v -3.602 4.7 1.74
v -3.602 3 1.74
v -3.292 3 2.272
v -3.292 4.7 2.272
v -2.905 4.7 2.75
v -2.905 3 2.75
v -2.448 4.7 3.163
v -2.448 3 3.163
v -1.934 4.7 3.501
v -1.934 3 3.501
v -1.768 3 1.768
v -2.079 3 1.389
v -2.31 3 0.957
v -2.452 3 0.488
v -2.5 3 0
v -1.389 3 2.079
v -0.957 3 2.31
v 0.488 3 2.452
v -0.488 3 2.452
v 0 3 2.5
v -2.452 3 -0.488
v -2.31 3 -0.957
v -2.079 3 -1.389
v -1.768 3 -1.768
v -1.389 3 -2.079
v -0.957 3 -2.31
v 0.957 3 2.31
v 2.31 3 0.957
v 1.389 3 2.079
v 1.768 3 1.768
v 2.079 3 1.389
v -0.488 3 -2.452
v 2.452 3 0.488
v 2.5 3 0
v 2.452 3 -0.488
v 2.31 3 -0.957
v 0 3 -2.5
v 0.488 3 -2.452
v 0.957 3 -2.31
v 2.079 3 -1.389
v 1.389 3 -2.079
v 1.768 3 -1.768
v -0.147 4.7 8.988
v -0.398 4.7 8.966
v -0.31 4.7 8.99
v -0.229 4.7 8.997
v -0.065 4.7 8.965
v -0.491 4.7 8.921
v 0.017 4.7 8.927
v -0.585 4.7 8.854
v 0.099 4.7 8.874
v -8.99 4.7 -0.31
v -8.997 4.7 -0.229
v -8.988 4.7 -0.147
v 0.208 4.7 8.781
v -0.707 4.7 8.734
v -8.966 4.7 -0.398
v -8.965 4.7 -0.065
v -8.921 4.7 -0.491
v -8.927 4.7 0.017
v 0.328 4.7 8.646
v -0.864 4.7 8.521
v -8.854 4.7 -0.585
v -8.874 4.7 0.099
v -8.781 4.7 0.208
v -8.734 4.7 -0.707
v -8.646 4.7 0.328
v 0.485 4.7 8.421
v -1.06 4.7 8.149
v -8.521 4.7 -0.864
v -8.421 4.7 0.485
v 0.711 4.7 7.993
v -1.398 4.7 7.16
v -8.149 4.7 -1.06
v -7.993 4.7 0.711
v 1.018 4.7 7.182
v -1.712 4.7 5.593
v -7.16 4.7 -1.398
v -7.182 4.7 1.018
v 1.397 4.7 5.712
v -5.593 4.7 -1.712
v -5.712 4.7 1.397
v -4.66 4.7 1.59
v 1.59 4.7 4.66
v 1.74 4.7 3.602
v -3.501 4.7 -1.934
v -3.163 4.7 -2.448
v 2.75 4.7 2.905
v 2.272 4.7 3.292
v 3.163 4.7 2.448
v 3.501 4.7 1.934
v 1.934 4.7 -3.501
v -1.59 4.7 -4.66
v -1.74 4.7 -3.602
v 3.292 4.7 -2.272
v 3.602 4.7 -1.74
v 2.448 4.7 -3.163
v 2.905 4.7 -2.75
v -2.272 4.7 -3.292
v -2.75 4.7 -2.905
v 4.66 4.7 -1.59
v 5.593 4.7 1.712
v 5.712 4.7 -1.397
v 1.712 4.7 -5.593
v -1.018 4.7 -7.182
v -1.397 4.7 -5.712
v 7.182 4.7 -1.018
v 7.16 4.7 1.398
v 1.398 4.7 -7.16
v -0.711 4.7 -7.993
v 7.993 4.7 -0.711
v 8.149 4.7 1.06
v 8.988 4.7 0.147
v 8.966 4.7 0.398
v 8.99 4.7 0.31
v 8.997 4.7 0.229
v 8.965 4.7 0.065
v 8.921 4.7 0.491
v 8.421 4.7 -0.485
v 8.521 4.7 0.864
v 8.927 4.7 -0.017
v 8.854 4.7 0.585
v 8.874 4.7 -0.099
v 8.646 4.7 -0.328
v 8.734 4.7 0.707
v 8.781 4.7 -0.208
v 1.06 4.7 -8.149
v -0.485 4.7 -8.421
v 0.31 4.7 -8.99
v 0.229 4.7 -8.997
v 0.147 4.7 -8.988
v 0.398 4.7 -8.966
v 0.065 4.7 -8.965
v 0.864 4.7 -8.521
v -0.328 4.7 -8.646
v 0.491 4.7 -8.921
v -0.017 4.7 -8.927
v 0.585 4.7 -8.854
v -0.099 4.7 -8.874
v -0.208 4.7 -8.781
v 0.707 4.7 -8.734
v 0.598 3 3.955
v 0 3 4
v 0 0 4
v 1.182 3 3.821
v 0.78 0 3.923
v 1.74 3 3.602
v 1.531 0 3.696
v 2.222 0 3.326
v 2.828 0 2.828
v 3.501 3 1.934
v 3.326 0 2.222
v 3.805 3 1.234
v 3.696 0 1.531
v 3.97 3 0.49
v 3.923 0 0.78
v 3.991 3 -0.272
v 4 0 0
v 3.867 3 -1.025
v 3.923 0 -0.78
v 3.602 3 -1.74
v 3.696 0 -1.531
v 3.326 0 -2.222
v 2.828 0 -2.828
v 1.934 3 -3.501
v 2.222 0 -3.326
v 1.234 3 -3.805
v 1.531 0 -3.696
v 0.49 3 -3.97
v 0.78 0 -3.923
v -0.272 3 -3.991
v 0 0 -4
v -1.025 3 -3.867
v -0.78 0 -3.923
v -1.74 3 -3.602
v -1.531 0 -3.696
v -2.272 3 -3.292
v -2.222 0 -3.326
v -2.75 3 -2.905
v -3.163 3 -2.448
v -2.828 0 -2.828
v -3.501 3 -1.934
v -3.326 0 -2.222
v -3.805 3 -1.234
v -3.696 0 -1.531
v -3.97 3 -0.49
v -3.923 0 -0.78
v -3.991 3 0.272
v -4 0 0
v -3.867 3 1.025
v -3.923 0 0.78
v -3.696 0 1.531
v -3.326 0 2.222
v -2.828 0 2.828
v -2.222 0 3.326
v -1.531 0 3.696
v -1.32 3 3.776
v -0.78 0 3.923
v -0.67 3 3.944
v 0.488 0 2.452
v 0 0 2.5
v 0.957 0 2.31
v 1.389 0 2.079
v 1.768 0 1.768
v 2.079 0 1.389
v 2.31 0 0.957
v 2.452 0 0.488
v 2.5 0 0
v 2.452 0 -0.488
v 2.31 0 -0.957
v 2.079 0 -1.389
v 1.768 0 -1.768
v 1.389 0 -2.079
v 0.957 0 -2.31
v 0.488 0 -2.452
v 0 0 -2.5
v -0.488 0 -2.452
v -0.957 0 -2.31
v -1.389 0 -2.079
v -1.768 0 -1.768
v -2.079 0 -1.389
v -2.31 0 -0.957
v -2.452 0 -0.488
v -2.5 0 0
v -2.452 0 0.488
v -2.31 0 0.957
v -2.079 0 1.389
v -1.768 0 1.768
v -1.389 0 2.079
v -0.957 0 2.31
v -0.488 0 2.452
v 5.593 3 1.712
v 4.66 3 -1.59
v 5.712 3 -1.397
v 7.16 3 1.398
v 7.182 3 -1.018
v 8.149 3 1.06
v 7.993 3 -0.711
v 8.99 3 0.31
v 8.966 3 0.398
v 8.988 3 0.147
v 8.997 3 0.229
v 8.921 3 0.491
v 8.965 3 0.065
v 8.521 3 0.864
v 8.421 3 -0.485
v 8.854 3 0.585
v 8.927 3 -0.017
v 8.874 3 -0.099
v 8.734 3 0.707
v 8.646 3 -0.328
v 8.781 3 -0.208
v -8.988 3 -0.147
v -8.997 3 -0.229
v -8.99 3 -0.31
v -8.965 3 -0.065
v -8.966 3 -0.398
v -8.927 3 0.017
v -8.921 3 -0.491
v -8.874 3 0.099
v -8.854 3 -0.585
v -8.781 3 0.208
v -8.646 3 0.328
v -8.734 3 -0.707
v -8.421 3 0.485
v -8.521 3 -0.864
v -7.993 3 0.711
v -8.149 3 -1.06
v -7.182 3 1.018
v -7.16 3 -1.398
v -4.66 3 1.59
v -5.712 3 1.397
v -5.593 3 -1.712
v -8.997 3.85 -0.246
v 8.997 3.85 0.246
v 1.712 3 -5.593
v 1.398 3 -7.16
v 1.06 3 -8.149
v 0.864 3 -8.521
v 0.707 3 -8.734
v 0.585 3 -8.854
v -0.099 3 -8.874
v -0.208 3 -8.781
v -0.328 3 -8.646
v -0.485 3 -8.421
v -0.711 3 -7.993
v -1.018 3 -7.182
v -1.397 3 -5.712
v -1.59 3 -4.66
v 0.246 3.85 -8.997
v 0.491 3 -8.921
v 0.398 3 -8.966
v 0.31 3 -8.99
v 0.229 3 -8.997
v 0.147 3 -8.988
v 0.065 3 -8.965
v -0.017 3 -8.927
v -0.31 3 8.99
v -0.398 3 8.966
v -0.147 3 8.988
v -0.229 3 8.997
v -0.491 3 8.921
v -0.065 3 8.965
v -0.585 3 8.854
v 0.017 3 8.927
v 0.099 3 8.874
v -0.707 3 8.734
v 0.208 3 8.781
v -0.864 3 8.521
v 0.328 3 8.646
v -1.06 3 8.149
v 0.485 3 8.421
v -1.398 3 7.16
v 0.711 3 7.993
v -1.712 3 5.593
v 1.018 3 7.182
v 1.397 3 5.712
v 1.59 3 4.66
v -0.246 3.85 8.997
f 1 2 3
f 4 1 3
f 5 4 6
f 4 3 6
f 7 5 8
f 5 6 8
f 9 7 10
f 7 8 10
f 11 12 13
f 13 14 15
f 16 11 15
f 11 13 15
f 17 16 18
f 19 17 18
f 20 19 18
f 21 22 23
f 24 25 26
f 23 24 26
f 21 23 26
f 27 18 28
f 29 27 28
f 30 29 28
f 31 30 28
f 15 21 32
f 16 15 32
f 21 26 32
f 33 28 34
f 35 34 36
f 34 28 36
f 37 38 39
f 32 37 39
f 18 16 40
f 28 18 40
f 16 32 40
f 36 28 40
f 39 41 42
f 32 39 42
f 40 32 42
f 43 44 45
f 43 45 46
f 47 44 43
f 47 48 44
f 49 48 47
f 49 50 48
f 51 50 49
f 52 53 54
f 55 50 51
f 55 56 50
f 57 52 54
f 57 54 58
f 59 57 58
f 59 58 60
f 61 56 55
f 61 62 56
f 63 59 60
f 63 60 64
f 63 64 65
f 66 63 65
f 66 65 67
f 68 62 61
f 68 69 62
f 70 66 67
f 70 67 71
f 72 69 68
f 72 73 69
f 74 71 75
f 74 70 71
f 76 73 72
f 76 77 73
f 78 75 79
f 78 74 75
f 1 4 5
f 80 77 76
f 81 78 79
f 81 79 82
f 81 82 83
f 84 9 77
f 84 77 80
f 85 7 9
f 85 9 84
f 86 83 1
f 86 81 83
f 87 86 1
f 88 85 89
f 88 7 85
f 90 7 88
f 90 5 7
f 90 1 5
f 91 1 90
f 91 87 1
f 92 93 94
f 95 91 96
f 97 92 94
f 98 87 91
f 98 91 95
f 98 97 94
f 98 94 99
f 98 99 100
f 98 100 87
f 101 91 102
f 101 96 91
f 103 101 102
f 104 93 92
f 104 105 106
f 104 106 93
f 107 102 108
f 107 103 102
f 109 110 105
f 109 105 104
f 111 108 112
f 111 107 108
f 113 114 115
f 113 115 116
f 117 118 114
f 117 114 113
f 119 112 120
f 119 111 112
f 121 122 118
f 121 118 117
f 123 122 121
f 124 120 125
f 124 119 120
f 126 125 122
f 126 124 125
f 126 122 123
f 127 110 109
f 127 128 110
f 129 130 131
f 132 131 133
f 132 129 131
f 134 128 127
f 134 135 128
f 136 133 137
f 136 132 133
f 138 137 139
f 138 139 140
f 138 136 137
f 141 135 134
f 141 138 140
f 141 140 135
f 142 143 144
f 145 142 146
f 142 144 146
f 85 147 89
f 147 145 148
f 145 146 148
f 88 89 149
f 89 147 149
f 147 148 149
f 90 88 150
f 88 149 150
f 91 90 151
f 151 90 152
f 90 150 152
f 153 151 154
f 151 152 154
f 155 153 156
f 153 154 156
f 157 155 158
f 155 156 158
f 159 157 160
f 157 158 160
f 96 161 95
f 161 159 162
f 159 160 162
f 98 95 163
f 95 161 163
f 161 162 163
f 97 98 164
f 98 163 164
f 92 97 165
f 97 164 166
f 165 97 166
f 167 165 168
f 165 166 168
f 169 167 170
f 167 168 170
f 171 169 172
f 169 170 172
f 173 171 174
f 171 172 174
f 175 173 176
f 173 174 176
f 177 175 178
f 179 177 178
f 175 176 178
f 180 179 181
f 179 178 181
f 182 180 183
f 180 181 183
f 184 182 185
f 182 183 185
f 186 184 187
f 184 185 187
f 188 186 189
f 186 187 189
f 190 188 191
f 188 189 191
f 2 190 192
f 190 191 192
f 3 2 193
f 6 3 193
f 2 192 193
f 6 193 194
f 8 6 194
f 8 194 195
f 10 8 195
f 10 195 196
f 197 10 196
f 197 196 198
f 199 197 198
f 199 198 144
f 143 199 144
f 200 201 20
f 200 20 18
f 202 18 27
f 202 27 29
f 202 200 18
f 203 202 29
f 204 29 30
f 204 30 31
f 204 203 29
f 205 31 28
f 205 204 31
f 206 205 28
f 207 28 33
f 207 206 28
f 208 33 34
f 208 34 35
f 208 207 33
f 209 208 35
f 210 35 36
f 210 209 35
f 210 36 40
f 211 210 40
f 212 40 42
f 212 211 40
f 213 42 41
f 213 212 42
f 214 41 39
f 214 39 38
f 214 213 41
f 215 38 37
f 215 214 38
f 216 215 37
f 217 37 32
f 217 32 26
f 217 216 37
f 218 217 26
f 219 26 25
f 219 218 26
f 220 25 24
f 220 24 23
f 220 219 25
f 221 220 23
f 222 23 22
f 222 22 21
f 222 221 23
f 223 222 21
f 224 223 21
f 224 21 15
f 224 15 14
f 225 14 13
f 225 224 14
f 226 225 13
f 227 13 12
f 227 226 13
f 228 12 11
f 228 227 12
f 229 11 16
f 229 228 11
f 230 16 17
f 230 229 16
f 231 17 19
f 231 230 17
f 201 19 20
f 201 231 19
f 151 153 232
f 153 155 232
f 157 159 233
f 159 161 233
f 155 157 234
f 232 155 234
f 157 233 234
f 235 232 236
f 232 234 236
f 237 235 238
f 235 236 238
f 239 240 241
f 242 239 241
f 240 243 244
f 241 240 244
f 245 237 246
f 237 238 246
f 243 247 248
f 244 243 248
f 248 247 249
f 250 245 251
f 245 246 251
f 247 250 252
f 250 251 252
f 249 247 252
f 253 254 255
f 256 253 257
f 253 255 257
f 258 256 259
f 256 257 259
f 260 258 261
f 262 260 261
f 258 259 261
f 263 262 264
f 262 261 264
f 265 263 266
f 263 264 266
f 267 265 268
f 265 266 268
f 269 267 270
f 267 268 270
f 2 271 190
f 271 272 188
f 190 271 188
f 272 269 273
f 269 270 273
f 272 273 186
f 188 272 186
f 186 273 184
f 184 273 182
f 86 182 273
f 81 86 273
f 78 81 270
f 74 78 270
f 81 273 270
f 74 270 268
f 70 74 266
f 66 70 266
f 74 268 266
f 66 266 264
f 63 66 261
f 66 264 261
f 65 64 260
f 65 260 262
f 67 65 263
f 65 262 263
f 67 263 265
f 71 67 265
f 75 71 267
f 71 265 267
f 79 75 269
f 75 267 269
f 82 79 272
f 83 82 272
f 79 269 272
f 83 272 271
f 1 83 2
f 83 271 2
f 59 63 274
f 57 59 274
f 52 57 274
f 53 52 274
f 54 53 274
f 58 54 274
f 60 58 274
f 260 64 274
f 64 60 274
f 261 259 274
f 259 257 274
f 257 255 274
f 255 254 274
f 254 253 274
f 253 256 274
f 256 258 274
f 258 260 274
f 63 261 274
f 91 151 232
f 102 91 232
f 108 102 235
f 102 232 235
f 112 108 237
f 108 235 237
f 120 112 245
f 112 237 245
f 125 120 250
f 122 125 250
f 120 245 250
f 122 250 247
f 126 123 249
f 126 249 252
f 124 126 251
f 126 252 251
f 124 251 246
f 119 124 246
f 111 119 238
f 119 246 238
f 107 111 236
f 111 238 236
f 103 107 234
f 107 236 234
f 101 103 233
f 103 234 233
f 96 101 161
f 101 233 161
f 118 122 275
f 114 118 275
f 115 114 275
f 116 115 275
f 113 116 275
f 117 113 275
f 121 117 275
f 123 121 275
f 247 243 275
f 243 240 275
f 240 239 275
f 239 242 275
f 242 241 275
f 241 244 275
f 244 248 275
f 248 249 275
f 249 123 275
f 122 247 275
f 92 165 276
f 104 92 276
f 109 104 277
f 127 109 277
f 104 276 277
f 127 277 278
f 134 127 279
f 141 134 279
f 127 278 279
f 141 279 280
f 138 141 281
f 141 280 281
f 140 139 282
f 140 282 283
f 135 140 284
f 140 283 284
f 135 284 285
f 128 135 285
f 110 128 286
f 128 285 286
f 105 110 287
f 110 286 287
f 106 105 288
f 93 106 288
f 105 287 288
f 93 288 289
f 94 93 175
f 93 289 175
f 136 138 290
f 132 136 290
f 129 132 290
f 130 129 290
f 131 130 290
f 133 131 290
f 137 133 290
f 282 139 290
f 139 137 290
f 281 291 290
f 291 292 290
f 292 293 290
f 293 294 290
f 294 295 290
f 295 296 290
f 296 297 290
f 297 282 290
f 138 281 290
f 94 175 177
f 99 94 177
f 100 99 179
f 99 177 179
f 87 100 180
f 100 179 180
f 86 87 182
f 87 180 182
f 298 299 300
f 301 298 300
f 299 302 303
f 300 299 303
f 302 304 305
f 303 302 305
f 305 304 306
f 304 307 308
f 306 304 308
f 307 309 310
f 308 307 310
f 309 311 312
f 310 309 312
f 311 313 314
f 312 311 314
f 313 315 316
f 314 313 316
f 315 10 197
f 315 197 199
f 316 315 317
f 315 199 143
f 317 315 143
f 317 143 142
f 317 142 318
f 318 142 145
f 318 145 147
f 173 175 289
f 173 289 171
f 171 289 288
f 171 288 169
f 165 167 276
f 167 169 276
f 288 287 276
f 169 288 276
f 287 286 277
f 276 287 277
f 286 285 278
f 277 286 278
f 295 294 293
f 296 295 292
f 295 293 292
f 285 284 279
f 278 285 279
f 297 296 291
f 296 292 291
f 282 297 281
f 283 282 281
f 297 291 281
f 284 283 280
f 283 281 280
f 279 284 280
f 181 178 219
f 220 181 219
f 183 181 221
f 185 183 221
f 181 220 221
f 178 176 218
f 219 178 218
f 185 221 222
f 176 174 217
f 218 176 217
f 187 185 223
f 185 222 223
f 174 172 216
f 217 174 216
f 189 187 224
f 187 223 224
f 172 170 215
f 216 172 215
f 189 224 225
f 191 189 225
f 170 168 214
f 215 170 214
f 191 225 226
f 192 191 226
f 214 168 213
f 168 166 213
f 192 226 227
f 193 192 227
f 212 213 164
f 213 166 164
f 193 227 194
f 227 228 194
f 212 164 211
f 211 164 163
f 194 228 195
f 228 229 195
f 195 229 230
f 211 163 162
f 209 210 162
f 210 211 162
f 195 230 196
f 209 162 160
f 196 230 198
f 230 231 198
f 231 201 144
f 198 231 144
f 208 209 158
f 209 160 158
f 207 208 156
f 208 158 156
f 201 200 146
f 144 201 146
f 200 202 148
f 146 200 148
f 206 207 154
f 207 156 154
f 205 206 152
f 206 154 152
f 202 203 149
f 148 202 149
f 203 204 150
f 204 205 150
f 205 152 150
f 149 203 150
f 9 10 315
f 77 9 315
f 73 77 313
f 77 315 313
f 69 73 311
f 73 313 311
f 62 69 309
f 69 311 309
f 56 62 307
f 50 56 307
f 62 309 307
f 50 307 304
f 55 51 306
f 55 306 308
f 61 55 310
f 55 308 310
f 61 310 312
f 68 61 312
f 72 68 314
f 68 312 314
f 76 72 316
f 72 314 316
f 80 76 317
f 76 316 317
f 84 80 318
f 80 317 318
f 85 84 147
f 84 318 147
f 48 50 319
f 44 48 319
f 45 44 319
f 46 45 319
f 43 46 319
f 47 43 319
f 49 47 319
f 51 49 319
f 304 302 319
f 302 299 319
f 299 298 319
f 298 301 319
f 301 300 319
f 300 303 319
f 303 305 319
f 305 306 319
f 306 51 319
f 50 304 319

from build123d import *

# Parameters (mm, degrees)
SKETCH_1_R      = 4
SKETCH_1_R_2    = 2.5
EXTRUDE_1_DEPTH = 3
SKETCH_2_R      = 4
EXTRUDE_2_DEPTH = 1.7


with BuildPart() as part:
    # 草图1 → 凸台-拉伸1 (new body)
    with BuildSketch(Plane(origin=(0, 0, 0), x_dir=(1, 0, 0), z_dir=(0, 1, 0))):
        with Locations(Location((0, 0, 0), (0, 0, 270))):
            Circle(SKETCH_1_R)
        with Locations(Location((0, 0, 0), (0, 0, 270))):
            Circle(SKETCH_1_R_2, mode=Mode.SUBTRACT)
    extrude(amount=EXTRUDE_1_DEPTH)

    # 草图2 → 凸台-拉伸2 (add)
    with BuildSketch(Plane(origin=(0, 3, 0), x_dir=(1, 0, 0), z_dir=(0, 1, 0))):
        with BuildLine():
            ThreePointArc((3.601811154, 1.73981505), (3.899182261, 0.892399962), (4, 0))
            ThreePointArc((4, 0), (3.873348744, -0.998583752), (3.501415245, -1.933931561))
            add(Edge.make_bspline(
                [(3.501415245, -1.933931561), (22.78951803, -0.622790472), (3.601811154, 1.73981505)],
                knots=[1.976614939, 1.976614939, 1.976614939, 4.306570368, 4.306570368, 4.306570368], degree=2, weights=[1, 0.394771017, 1]))
        make_face()
        with BuildLine():
            ThreePointArc((-1.73981505, 3.601811154), (0.109270946, 3.998507204), (1.933931561, 3.501415245))
            add(Edge.make_bspline(
                [(1.933931561, 3.501415245), (0.622790472, 22.78951803), (-1.73981505, 3.601811154)],
                knots=[5.118207593, 5.118207593, 5.118207593, 7.448163021, 7.448163021, 7.448163021], degree=2, weights=[1, 0.394771017, 1]))
        make_face()
        with BuildLine():
            ThreePointArc((-3.601811154, -1.73981505), (-3.998507204, 0.109270946), (-3.501415245, 1.933931561))
            add(Edge.make_bspline(
                [(-3.501415245, 1.933931561), (-22.78951803, 0.622790472), (-3.601811154, -1.73981505)],
                knots=[5.118207593, 5.118207593, 5.118207593, 7.448163021, 7.448163021, 7.448163021], degree=2, weights=[1, 0.394771017, 1]))
        make_face()
        with BuildLine():
            add(Edge.make_bspline(
                [(-1.933931561, -3.501415245), (-0.622790472, -22.78951803), (1.73981505, -3.601811154)],
                knots=[1.976614939, 1.976614939, 1.976614939, 4.306570368, 4.306570368, 4.306570368], degree=2, weights=[1, 0.394771017, 1]))
            ThreePointArc((1.73981505, -3.601811154), (-0.109270946, -3.998507204), (-1.933931561, -3.501415245))
        make_face()
        with Locations(Location((0, 0, 0), (0, 0, 115.782351759))):
            Circle(SKETCH_2_R)
    extrude(amount=EXTRUDE_2_DEPTH)


solid = part.part
